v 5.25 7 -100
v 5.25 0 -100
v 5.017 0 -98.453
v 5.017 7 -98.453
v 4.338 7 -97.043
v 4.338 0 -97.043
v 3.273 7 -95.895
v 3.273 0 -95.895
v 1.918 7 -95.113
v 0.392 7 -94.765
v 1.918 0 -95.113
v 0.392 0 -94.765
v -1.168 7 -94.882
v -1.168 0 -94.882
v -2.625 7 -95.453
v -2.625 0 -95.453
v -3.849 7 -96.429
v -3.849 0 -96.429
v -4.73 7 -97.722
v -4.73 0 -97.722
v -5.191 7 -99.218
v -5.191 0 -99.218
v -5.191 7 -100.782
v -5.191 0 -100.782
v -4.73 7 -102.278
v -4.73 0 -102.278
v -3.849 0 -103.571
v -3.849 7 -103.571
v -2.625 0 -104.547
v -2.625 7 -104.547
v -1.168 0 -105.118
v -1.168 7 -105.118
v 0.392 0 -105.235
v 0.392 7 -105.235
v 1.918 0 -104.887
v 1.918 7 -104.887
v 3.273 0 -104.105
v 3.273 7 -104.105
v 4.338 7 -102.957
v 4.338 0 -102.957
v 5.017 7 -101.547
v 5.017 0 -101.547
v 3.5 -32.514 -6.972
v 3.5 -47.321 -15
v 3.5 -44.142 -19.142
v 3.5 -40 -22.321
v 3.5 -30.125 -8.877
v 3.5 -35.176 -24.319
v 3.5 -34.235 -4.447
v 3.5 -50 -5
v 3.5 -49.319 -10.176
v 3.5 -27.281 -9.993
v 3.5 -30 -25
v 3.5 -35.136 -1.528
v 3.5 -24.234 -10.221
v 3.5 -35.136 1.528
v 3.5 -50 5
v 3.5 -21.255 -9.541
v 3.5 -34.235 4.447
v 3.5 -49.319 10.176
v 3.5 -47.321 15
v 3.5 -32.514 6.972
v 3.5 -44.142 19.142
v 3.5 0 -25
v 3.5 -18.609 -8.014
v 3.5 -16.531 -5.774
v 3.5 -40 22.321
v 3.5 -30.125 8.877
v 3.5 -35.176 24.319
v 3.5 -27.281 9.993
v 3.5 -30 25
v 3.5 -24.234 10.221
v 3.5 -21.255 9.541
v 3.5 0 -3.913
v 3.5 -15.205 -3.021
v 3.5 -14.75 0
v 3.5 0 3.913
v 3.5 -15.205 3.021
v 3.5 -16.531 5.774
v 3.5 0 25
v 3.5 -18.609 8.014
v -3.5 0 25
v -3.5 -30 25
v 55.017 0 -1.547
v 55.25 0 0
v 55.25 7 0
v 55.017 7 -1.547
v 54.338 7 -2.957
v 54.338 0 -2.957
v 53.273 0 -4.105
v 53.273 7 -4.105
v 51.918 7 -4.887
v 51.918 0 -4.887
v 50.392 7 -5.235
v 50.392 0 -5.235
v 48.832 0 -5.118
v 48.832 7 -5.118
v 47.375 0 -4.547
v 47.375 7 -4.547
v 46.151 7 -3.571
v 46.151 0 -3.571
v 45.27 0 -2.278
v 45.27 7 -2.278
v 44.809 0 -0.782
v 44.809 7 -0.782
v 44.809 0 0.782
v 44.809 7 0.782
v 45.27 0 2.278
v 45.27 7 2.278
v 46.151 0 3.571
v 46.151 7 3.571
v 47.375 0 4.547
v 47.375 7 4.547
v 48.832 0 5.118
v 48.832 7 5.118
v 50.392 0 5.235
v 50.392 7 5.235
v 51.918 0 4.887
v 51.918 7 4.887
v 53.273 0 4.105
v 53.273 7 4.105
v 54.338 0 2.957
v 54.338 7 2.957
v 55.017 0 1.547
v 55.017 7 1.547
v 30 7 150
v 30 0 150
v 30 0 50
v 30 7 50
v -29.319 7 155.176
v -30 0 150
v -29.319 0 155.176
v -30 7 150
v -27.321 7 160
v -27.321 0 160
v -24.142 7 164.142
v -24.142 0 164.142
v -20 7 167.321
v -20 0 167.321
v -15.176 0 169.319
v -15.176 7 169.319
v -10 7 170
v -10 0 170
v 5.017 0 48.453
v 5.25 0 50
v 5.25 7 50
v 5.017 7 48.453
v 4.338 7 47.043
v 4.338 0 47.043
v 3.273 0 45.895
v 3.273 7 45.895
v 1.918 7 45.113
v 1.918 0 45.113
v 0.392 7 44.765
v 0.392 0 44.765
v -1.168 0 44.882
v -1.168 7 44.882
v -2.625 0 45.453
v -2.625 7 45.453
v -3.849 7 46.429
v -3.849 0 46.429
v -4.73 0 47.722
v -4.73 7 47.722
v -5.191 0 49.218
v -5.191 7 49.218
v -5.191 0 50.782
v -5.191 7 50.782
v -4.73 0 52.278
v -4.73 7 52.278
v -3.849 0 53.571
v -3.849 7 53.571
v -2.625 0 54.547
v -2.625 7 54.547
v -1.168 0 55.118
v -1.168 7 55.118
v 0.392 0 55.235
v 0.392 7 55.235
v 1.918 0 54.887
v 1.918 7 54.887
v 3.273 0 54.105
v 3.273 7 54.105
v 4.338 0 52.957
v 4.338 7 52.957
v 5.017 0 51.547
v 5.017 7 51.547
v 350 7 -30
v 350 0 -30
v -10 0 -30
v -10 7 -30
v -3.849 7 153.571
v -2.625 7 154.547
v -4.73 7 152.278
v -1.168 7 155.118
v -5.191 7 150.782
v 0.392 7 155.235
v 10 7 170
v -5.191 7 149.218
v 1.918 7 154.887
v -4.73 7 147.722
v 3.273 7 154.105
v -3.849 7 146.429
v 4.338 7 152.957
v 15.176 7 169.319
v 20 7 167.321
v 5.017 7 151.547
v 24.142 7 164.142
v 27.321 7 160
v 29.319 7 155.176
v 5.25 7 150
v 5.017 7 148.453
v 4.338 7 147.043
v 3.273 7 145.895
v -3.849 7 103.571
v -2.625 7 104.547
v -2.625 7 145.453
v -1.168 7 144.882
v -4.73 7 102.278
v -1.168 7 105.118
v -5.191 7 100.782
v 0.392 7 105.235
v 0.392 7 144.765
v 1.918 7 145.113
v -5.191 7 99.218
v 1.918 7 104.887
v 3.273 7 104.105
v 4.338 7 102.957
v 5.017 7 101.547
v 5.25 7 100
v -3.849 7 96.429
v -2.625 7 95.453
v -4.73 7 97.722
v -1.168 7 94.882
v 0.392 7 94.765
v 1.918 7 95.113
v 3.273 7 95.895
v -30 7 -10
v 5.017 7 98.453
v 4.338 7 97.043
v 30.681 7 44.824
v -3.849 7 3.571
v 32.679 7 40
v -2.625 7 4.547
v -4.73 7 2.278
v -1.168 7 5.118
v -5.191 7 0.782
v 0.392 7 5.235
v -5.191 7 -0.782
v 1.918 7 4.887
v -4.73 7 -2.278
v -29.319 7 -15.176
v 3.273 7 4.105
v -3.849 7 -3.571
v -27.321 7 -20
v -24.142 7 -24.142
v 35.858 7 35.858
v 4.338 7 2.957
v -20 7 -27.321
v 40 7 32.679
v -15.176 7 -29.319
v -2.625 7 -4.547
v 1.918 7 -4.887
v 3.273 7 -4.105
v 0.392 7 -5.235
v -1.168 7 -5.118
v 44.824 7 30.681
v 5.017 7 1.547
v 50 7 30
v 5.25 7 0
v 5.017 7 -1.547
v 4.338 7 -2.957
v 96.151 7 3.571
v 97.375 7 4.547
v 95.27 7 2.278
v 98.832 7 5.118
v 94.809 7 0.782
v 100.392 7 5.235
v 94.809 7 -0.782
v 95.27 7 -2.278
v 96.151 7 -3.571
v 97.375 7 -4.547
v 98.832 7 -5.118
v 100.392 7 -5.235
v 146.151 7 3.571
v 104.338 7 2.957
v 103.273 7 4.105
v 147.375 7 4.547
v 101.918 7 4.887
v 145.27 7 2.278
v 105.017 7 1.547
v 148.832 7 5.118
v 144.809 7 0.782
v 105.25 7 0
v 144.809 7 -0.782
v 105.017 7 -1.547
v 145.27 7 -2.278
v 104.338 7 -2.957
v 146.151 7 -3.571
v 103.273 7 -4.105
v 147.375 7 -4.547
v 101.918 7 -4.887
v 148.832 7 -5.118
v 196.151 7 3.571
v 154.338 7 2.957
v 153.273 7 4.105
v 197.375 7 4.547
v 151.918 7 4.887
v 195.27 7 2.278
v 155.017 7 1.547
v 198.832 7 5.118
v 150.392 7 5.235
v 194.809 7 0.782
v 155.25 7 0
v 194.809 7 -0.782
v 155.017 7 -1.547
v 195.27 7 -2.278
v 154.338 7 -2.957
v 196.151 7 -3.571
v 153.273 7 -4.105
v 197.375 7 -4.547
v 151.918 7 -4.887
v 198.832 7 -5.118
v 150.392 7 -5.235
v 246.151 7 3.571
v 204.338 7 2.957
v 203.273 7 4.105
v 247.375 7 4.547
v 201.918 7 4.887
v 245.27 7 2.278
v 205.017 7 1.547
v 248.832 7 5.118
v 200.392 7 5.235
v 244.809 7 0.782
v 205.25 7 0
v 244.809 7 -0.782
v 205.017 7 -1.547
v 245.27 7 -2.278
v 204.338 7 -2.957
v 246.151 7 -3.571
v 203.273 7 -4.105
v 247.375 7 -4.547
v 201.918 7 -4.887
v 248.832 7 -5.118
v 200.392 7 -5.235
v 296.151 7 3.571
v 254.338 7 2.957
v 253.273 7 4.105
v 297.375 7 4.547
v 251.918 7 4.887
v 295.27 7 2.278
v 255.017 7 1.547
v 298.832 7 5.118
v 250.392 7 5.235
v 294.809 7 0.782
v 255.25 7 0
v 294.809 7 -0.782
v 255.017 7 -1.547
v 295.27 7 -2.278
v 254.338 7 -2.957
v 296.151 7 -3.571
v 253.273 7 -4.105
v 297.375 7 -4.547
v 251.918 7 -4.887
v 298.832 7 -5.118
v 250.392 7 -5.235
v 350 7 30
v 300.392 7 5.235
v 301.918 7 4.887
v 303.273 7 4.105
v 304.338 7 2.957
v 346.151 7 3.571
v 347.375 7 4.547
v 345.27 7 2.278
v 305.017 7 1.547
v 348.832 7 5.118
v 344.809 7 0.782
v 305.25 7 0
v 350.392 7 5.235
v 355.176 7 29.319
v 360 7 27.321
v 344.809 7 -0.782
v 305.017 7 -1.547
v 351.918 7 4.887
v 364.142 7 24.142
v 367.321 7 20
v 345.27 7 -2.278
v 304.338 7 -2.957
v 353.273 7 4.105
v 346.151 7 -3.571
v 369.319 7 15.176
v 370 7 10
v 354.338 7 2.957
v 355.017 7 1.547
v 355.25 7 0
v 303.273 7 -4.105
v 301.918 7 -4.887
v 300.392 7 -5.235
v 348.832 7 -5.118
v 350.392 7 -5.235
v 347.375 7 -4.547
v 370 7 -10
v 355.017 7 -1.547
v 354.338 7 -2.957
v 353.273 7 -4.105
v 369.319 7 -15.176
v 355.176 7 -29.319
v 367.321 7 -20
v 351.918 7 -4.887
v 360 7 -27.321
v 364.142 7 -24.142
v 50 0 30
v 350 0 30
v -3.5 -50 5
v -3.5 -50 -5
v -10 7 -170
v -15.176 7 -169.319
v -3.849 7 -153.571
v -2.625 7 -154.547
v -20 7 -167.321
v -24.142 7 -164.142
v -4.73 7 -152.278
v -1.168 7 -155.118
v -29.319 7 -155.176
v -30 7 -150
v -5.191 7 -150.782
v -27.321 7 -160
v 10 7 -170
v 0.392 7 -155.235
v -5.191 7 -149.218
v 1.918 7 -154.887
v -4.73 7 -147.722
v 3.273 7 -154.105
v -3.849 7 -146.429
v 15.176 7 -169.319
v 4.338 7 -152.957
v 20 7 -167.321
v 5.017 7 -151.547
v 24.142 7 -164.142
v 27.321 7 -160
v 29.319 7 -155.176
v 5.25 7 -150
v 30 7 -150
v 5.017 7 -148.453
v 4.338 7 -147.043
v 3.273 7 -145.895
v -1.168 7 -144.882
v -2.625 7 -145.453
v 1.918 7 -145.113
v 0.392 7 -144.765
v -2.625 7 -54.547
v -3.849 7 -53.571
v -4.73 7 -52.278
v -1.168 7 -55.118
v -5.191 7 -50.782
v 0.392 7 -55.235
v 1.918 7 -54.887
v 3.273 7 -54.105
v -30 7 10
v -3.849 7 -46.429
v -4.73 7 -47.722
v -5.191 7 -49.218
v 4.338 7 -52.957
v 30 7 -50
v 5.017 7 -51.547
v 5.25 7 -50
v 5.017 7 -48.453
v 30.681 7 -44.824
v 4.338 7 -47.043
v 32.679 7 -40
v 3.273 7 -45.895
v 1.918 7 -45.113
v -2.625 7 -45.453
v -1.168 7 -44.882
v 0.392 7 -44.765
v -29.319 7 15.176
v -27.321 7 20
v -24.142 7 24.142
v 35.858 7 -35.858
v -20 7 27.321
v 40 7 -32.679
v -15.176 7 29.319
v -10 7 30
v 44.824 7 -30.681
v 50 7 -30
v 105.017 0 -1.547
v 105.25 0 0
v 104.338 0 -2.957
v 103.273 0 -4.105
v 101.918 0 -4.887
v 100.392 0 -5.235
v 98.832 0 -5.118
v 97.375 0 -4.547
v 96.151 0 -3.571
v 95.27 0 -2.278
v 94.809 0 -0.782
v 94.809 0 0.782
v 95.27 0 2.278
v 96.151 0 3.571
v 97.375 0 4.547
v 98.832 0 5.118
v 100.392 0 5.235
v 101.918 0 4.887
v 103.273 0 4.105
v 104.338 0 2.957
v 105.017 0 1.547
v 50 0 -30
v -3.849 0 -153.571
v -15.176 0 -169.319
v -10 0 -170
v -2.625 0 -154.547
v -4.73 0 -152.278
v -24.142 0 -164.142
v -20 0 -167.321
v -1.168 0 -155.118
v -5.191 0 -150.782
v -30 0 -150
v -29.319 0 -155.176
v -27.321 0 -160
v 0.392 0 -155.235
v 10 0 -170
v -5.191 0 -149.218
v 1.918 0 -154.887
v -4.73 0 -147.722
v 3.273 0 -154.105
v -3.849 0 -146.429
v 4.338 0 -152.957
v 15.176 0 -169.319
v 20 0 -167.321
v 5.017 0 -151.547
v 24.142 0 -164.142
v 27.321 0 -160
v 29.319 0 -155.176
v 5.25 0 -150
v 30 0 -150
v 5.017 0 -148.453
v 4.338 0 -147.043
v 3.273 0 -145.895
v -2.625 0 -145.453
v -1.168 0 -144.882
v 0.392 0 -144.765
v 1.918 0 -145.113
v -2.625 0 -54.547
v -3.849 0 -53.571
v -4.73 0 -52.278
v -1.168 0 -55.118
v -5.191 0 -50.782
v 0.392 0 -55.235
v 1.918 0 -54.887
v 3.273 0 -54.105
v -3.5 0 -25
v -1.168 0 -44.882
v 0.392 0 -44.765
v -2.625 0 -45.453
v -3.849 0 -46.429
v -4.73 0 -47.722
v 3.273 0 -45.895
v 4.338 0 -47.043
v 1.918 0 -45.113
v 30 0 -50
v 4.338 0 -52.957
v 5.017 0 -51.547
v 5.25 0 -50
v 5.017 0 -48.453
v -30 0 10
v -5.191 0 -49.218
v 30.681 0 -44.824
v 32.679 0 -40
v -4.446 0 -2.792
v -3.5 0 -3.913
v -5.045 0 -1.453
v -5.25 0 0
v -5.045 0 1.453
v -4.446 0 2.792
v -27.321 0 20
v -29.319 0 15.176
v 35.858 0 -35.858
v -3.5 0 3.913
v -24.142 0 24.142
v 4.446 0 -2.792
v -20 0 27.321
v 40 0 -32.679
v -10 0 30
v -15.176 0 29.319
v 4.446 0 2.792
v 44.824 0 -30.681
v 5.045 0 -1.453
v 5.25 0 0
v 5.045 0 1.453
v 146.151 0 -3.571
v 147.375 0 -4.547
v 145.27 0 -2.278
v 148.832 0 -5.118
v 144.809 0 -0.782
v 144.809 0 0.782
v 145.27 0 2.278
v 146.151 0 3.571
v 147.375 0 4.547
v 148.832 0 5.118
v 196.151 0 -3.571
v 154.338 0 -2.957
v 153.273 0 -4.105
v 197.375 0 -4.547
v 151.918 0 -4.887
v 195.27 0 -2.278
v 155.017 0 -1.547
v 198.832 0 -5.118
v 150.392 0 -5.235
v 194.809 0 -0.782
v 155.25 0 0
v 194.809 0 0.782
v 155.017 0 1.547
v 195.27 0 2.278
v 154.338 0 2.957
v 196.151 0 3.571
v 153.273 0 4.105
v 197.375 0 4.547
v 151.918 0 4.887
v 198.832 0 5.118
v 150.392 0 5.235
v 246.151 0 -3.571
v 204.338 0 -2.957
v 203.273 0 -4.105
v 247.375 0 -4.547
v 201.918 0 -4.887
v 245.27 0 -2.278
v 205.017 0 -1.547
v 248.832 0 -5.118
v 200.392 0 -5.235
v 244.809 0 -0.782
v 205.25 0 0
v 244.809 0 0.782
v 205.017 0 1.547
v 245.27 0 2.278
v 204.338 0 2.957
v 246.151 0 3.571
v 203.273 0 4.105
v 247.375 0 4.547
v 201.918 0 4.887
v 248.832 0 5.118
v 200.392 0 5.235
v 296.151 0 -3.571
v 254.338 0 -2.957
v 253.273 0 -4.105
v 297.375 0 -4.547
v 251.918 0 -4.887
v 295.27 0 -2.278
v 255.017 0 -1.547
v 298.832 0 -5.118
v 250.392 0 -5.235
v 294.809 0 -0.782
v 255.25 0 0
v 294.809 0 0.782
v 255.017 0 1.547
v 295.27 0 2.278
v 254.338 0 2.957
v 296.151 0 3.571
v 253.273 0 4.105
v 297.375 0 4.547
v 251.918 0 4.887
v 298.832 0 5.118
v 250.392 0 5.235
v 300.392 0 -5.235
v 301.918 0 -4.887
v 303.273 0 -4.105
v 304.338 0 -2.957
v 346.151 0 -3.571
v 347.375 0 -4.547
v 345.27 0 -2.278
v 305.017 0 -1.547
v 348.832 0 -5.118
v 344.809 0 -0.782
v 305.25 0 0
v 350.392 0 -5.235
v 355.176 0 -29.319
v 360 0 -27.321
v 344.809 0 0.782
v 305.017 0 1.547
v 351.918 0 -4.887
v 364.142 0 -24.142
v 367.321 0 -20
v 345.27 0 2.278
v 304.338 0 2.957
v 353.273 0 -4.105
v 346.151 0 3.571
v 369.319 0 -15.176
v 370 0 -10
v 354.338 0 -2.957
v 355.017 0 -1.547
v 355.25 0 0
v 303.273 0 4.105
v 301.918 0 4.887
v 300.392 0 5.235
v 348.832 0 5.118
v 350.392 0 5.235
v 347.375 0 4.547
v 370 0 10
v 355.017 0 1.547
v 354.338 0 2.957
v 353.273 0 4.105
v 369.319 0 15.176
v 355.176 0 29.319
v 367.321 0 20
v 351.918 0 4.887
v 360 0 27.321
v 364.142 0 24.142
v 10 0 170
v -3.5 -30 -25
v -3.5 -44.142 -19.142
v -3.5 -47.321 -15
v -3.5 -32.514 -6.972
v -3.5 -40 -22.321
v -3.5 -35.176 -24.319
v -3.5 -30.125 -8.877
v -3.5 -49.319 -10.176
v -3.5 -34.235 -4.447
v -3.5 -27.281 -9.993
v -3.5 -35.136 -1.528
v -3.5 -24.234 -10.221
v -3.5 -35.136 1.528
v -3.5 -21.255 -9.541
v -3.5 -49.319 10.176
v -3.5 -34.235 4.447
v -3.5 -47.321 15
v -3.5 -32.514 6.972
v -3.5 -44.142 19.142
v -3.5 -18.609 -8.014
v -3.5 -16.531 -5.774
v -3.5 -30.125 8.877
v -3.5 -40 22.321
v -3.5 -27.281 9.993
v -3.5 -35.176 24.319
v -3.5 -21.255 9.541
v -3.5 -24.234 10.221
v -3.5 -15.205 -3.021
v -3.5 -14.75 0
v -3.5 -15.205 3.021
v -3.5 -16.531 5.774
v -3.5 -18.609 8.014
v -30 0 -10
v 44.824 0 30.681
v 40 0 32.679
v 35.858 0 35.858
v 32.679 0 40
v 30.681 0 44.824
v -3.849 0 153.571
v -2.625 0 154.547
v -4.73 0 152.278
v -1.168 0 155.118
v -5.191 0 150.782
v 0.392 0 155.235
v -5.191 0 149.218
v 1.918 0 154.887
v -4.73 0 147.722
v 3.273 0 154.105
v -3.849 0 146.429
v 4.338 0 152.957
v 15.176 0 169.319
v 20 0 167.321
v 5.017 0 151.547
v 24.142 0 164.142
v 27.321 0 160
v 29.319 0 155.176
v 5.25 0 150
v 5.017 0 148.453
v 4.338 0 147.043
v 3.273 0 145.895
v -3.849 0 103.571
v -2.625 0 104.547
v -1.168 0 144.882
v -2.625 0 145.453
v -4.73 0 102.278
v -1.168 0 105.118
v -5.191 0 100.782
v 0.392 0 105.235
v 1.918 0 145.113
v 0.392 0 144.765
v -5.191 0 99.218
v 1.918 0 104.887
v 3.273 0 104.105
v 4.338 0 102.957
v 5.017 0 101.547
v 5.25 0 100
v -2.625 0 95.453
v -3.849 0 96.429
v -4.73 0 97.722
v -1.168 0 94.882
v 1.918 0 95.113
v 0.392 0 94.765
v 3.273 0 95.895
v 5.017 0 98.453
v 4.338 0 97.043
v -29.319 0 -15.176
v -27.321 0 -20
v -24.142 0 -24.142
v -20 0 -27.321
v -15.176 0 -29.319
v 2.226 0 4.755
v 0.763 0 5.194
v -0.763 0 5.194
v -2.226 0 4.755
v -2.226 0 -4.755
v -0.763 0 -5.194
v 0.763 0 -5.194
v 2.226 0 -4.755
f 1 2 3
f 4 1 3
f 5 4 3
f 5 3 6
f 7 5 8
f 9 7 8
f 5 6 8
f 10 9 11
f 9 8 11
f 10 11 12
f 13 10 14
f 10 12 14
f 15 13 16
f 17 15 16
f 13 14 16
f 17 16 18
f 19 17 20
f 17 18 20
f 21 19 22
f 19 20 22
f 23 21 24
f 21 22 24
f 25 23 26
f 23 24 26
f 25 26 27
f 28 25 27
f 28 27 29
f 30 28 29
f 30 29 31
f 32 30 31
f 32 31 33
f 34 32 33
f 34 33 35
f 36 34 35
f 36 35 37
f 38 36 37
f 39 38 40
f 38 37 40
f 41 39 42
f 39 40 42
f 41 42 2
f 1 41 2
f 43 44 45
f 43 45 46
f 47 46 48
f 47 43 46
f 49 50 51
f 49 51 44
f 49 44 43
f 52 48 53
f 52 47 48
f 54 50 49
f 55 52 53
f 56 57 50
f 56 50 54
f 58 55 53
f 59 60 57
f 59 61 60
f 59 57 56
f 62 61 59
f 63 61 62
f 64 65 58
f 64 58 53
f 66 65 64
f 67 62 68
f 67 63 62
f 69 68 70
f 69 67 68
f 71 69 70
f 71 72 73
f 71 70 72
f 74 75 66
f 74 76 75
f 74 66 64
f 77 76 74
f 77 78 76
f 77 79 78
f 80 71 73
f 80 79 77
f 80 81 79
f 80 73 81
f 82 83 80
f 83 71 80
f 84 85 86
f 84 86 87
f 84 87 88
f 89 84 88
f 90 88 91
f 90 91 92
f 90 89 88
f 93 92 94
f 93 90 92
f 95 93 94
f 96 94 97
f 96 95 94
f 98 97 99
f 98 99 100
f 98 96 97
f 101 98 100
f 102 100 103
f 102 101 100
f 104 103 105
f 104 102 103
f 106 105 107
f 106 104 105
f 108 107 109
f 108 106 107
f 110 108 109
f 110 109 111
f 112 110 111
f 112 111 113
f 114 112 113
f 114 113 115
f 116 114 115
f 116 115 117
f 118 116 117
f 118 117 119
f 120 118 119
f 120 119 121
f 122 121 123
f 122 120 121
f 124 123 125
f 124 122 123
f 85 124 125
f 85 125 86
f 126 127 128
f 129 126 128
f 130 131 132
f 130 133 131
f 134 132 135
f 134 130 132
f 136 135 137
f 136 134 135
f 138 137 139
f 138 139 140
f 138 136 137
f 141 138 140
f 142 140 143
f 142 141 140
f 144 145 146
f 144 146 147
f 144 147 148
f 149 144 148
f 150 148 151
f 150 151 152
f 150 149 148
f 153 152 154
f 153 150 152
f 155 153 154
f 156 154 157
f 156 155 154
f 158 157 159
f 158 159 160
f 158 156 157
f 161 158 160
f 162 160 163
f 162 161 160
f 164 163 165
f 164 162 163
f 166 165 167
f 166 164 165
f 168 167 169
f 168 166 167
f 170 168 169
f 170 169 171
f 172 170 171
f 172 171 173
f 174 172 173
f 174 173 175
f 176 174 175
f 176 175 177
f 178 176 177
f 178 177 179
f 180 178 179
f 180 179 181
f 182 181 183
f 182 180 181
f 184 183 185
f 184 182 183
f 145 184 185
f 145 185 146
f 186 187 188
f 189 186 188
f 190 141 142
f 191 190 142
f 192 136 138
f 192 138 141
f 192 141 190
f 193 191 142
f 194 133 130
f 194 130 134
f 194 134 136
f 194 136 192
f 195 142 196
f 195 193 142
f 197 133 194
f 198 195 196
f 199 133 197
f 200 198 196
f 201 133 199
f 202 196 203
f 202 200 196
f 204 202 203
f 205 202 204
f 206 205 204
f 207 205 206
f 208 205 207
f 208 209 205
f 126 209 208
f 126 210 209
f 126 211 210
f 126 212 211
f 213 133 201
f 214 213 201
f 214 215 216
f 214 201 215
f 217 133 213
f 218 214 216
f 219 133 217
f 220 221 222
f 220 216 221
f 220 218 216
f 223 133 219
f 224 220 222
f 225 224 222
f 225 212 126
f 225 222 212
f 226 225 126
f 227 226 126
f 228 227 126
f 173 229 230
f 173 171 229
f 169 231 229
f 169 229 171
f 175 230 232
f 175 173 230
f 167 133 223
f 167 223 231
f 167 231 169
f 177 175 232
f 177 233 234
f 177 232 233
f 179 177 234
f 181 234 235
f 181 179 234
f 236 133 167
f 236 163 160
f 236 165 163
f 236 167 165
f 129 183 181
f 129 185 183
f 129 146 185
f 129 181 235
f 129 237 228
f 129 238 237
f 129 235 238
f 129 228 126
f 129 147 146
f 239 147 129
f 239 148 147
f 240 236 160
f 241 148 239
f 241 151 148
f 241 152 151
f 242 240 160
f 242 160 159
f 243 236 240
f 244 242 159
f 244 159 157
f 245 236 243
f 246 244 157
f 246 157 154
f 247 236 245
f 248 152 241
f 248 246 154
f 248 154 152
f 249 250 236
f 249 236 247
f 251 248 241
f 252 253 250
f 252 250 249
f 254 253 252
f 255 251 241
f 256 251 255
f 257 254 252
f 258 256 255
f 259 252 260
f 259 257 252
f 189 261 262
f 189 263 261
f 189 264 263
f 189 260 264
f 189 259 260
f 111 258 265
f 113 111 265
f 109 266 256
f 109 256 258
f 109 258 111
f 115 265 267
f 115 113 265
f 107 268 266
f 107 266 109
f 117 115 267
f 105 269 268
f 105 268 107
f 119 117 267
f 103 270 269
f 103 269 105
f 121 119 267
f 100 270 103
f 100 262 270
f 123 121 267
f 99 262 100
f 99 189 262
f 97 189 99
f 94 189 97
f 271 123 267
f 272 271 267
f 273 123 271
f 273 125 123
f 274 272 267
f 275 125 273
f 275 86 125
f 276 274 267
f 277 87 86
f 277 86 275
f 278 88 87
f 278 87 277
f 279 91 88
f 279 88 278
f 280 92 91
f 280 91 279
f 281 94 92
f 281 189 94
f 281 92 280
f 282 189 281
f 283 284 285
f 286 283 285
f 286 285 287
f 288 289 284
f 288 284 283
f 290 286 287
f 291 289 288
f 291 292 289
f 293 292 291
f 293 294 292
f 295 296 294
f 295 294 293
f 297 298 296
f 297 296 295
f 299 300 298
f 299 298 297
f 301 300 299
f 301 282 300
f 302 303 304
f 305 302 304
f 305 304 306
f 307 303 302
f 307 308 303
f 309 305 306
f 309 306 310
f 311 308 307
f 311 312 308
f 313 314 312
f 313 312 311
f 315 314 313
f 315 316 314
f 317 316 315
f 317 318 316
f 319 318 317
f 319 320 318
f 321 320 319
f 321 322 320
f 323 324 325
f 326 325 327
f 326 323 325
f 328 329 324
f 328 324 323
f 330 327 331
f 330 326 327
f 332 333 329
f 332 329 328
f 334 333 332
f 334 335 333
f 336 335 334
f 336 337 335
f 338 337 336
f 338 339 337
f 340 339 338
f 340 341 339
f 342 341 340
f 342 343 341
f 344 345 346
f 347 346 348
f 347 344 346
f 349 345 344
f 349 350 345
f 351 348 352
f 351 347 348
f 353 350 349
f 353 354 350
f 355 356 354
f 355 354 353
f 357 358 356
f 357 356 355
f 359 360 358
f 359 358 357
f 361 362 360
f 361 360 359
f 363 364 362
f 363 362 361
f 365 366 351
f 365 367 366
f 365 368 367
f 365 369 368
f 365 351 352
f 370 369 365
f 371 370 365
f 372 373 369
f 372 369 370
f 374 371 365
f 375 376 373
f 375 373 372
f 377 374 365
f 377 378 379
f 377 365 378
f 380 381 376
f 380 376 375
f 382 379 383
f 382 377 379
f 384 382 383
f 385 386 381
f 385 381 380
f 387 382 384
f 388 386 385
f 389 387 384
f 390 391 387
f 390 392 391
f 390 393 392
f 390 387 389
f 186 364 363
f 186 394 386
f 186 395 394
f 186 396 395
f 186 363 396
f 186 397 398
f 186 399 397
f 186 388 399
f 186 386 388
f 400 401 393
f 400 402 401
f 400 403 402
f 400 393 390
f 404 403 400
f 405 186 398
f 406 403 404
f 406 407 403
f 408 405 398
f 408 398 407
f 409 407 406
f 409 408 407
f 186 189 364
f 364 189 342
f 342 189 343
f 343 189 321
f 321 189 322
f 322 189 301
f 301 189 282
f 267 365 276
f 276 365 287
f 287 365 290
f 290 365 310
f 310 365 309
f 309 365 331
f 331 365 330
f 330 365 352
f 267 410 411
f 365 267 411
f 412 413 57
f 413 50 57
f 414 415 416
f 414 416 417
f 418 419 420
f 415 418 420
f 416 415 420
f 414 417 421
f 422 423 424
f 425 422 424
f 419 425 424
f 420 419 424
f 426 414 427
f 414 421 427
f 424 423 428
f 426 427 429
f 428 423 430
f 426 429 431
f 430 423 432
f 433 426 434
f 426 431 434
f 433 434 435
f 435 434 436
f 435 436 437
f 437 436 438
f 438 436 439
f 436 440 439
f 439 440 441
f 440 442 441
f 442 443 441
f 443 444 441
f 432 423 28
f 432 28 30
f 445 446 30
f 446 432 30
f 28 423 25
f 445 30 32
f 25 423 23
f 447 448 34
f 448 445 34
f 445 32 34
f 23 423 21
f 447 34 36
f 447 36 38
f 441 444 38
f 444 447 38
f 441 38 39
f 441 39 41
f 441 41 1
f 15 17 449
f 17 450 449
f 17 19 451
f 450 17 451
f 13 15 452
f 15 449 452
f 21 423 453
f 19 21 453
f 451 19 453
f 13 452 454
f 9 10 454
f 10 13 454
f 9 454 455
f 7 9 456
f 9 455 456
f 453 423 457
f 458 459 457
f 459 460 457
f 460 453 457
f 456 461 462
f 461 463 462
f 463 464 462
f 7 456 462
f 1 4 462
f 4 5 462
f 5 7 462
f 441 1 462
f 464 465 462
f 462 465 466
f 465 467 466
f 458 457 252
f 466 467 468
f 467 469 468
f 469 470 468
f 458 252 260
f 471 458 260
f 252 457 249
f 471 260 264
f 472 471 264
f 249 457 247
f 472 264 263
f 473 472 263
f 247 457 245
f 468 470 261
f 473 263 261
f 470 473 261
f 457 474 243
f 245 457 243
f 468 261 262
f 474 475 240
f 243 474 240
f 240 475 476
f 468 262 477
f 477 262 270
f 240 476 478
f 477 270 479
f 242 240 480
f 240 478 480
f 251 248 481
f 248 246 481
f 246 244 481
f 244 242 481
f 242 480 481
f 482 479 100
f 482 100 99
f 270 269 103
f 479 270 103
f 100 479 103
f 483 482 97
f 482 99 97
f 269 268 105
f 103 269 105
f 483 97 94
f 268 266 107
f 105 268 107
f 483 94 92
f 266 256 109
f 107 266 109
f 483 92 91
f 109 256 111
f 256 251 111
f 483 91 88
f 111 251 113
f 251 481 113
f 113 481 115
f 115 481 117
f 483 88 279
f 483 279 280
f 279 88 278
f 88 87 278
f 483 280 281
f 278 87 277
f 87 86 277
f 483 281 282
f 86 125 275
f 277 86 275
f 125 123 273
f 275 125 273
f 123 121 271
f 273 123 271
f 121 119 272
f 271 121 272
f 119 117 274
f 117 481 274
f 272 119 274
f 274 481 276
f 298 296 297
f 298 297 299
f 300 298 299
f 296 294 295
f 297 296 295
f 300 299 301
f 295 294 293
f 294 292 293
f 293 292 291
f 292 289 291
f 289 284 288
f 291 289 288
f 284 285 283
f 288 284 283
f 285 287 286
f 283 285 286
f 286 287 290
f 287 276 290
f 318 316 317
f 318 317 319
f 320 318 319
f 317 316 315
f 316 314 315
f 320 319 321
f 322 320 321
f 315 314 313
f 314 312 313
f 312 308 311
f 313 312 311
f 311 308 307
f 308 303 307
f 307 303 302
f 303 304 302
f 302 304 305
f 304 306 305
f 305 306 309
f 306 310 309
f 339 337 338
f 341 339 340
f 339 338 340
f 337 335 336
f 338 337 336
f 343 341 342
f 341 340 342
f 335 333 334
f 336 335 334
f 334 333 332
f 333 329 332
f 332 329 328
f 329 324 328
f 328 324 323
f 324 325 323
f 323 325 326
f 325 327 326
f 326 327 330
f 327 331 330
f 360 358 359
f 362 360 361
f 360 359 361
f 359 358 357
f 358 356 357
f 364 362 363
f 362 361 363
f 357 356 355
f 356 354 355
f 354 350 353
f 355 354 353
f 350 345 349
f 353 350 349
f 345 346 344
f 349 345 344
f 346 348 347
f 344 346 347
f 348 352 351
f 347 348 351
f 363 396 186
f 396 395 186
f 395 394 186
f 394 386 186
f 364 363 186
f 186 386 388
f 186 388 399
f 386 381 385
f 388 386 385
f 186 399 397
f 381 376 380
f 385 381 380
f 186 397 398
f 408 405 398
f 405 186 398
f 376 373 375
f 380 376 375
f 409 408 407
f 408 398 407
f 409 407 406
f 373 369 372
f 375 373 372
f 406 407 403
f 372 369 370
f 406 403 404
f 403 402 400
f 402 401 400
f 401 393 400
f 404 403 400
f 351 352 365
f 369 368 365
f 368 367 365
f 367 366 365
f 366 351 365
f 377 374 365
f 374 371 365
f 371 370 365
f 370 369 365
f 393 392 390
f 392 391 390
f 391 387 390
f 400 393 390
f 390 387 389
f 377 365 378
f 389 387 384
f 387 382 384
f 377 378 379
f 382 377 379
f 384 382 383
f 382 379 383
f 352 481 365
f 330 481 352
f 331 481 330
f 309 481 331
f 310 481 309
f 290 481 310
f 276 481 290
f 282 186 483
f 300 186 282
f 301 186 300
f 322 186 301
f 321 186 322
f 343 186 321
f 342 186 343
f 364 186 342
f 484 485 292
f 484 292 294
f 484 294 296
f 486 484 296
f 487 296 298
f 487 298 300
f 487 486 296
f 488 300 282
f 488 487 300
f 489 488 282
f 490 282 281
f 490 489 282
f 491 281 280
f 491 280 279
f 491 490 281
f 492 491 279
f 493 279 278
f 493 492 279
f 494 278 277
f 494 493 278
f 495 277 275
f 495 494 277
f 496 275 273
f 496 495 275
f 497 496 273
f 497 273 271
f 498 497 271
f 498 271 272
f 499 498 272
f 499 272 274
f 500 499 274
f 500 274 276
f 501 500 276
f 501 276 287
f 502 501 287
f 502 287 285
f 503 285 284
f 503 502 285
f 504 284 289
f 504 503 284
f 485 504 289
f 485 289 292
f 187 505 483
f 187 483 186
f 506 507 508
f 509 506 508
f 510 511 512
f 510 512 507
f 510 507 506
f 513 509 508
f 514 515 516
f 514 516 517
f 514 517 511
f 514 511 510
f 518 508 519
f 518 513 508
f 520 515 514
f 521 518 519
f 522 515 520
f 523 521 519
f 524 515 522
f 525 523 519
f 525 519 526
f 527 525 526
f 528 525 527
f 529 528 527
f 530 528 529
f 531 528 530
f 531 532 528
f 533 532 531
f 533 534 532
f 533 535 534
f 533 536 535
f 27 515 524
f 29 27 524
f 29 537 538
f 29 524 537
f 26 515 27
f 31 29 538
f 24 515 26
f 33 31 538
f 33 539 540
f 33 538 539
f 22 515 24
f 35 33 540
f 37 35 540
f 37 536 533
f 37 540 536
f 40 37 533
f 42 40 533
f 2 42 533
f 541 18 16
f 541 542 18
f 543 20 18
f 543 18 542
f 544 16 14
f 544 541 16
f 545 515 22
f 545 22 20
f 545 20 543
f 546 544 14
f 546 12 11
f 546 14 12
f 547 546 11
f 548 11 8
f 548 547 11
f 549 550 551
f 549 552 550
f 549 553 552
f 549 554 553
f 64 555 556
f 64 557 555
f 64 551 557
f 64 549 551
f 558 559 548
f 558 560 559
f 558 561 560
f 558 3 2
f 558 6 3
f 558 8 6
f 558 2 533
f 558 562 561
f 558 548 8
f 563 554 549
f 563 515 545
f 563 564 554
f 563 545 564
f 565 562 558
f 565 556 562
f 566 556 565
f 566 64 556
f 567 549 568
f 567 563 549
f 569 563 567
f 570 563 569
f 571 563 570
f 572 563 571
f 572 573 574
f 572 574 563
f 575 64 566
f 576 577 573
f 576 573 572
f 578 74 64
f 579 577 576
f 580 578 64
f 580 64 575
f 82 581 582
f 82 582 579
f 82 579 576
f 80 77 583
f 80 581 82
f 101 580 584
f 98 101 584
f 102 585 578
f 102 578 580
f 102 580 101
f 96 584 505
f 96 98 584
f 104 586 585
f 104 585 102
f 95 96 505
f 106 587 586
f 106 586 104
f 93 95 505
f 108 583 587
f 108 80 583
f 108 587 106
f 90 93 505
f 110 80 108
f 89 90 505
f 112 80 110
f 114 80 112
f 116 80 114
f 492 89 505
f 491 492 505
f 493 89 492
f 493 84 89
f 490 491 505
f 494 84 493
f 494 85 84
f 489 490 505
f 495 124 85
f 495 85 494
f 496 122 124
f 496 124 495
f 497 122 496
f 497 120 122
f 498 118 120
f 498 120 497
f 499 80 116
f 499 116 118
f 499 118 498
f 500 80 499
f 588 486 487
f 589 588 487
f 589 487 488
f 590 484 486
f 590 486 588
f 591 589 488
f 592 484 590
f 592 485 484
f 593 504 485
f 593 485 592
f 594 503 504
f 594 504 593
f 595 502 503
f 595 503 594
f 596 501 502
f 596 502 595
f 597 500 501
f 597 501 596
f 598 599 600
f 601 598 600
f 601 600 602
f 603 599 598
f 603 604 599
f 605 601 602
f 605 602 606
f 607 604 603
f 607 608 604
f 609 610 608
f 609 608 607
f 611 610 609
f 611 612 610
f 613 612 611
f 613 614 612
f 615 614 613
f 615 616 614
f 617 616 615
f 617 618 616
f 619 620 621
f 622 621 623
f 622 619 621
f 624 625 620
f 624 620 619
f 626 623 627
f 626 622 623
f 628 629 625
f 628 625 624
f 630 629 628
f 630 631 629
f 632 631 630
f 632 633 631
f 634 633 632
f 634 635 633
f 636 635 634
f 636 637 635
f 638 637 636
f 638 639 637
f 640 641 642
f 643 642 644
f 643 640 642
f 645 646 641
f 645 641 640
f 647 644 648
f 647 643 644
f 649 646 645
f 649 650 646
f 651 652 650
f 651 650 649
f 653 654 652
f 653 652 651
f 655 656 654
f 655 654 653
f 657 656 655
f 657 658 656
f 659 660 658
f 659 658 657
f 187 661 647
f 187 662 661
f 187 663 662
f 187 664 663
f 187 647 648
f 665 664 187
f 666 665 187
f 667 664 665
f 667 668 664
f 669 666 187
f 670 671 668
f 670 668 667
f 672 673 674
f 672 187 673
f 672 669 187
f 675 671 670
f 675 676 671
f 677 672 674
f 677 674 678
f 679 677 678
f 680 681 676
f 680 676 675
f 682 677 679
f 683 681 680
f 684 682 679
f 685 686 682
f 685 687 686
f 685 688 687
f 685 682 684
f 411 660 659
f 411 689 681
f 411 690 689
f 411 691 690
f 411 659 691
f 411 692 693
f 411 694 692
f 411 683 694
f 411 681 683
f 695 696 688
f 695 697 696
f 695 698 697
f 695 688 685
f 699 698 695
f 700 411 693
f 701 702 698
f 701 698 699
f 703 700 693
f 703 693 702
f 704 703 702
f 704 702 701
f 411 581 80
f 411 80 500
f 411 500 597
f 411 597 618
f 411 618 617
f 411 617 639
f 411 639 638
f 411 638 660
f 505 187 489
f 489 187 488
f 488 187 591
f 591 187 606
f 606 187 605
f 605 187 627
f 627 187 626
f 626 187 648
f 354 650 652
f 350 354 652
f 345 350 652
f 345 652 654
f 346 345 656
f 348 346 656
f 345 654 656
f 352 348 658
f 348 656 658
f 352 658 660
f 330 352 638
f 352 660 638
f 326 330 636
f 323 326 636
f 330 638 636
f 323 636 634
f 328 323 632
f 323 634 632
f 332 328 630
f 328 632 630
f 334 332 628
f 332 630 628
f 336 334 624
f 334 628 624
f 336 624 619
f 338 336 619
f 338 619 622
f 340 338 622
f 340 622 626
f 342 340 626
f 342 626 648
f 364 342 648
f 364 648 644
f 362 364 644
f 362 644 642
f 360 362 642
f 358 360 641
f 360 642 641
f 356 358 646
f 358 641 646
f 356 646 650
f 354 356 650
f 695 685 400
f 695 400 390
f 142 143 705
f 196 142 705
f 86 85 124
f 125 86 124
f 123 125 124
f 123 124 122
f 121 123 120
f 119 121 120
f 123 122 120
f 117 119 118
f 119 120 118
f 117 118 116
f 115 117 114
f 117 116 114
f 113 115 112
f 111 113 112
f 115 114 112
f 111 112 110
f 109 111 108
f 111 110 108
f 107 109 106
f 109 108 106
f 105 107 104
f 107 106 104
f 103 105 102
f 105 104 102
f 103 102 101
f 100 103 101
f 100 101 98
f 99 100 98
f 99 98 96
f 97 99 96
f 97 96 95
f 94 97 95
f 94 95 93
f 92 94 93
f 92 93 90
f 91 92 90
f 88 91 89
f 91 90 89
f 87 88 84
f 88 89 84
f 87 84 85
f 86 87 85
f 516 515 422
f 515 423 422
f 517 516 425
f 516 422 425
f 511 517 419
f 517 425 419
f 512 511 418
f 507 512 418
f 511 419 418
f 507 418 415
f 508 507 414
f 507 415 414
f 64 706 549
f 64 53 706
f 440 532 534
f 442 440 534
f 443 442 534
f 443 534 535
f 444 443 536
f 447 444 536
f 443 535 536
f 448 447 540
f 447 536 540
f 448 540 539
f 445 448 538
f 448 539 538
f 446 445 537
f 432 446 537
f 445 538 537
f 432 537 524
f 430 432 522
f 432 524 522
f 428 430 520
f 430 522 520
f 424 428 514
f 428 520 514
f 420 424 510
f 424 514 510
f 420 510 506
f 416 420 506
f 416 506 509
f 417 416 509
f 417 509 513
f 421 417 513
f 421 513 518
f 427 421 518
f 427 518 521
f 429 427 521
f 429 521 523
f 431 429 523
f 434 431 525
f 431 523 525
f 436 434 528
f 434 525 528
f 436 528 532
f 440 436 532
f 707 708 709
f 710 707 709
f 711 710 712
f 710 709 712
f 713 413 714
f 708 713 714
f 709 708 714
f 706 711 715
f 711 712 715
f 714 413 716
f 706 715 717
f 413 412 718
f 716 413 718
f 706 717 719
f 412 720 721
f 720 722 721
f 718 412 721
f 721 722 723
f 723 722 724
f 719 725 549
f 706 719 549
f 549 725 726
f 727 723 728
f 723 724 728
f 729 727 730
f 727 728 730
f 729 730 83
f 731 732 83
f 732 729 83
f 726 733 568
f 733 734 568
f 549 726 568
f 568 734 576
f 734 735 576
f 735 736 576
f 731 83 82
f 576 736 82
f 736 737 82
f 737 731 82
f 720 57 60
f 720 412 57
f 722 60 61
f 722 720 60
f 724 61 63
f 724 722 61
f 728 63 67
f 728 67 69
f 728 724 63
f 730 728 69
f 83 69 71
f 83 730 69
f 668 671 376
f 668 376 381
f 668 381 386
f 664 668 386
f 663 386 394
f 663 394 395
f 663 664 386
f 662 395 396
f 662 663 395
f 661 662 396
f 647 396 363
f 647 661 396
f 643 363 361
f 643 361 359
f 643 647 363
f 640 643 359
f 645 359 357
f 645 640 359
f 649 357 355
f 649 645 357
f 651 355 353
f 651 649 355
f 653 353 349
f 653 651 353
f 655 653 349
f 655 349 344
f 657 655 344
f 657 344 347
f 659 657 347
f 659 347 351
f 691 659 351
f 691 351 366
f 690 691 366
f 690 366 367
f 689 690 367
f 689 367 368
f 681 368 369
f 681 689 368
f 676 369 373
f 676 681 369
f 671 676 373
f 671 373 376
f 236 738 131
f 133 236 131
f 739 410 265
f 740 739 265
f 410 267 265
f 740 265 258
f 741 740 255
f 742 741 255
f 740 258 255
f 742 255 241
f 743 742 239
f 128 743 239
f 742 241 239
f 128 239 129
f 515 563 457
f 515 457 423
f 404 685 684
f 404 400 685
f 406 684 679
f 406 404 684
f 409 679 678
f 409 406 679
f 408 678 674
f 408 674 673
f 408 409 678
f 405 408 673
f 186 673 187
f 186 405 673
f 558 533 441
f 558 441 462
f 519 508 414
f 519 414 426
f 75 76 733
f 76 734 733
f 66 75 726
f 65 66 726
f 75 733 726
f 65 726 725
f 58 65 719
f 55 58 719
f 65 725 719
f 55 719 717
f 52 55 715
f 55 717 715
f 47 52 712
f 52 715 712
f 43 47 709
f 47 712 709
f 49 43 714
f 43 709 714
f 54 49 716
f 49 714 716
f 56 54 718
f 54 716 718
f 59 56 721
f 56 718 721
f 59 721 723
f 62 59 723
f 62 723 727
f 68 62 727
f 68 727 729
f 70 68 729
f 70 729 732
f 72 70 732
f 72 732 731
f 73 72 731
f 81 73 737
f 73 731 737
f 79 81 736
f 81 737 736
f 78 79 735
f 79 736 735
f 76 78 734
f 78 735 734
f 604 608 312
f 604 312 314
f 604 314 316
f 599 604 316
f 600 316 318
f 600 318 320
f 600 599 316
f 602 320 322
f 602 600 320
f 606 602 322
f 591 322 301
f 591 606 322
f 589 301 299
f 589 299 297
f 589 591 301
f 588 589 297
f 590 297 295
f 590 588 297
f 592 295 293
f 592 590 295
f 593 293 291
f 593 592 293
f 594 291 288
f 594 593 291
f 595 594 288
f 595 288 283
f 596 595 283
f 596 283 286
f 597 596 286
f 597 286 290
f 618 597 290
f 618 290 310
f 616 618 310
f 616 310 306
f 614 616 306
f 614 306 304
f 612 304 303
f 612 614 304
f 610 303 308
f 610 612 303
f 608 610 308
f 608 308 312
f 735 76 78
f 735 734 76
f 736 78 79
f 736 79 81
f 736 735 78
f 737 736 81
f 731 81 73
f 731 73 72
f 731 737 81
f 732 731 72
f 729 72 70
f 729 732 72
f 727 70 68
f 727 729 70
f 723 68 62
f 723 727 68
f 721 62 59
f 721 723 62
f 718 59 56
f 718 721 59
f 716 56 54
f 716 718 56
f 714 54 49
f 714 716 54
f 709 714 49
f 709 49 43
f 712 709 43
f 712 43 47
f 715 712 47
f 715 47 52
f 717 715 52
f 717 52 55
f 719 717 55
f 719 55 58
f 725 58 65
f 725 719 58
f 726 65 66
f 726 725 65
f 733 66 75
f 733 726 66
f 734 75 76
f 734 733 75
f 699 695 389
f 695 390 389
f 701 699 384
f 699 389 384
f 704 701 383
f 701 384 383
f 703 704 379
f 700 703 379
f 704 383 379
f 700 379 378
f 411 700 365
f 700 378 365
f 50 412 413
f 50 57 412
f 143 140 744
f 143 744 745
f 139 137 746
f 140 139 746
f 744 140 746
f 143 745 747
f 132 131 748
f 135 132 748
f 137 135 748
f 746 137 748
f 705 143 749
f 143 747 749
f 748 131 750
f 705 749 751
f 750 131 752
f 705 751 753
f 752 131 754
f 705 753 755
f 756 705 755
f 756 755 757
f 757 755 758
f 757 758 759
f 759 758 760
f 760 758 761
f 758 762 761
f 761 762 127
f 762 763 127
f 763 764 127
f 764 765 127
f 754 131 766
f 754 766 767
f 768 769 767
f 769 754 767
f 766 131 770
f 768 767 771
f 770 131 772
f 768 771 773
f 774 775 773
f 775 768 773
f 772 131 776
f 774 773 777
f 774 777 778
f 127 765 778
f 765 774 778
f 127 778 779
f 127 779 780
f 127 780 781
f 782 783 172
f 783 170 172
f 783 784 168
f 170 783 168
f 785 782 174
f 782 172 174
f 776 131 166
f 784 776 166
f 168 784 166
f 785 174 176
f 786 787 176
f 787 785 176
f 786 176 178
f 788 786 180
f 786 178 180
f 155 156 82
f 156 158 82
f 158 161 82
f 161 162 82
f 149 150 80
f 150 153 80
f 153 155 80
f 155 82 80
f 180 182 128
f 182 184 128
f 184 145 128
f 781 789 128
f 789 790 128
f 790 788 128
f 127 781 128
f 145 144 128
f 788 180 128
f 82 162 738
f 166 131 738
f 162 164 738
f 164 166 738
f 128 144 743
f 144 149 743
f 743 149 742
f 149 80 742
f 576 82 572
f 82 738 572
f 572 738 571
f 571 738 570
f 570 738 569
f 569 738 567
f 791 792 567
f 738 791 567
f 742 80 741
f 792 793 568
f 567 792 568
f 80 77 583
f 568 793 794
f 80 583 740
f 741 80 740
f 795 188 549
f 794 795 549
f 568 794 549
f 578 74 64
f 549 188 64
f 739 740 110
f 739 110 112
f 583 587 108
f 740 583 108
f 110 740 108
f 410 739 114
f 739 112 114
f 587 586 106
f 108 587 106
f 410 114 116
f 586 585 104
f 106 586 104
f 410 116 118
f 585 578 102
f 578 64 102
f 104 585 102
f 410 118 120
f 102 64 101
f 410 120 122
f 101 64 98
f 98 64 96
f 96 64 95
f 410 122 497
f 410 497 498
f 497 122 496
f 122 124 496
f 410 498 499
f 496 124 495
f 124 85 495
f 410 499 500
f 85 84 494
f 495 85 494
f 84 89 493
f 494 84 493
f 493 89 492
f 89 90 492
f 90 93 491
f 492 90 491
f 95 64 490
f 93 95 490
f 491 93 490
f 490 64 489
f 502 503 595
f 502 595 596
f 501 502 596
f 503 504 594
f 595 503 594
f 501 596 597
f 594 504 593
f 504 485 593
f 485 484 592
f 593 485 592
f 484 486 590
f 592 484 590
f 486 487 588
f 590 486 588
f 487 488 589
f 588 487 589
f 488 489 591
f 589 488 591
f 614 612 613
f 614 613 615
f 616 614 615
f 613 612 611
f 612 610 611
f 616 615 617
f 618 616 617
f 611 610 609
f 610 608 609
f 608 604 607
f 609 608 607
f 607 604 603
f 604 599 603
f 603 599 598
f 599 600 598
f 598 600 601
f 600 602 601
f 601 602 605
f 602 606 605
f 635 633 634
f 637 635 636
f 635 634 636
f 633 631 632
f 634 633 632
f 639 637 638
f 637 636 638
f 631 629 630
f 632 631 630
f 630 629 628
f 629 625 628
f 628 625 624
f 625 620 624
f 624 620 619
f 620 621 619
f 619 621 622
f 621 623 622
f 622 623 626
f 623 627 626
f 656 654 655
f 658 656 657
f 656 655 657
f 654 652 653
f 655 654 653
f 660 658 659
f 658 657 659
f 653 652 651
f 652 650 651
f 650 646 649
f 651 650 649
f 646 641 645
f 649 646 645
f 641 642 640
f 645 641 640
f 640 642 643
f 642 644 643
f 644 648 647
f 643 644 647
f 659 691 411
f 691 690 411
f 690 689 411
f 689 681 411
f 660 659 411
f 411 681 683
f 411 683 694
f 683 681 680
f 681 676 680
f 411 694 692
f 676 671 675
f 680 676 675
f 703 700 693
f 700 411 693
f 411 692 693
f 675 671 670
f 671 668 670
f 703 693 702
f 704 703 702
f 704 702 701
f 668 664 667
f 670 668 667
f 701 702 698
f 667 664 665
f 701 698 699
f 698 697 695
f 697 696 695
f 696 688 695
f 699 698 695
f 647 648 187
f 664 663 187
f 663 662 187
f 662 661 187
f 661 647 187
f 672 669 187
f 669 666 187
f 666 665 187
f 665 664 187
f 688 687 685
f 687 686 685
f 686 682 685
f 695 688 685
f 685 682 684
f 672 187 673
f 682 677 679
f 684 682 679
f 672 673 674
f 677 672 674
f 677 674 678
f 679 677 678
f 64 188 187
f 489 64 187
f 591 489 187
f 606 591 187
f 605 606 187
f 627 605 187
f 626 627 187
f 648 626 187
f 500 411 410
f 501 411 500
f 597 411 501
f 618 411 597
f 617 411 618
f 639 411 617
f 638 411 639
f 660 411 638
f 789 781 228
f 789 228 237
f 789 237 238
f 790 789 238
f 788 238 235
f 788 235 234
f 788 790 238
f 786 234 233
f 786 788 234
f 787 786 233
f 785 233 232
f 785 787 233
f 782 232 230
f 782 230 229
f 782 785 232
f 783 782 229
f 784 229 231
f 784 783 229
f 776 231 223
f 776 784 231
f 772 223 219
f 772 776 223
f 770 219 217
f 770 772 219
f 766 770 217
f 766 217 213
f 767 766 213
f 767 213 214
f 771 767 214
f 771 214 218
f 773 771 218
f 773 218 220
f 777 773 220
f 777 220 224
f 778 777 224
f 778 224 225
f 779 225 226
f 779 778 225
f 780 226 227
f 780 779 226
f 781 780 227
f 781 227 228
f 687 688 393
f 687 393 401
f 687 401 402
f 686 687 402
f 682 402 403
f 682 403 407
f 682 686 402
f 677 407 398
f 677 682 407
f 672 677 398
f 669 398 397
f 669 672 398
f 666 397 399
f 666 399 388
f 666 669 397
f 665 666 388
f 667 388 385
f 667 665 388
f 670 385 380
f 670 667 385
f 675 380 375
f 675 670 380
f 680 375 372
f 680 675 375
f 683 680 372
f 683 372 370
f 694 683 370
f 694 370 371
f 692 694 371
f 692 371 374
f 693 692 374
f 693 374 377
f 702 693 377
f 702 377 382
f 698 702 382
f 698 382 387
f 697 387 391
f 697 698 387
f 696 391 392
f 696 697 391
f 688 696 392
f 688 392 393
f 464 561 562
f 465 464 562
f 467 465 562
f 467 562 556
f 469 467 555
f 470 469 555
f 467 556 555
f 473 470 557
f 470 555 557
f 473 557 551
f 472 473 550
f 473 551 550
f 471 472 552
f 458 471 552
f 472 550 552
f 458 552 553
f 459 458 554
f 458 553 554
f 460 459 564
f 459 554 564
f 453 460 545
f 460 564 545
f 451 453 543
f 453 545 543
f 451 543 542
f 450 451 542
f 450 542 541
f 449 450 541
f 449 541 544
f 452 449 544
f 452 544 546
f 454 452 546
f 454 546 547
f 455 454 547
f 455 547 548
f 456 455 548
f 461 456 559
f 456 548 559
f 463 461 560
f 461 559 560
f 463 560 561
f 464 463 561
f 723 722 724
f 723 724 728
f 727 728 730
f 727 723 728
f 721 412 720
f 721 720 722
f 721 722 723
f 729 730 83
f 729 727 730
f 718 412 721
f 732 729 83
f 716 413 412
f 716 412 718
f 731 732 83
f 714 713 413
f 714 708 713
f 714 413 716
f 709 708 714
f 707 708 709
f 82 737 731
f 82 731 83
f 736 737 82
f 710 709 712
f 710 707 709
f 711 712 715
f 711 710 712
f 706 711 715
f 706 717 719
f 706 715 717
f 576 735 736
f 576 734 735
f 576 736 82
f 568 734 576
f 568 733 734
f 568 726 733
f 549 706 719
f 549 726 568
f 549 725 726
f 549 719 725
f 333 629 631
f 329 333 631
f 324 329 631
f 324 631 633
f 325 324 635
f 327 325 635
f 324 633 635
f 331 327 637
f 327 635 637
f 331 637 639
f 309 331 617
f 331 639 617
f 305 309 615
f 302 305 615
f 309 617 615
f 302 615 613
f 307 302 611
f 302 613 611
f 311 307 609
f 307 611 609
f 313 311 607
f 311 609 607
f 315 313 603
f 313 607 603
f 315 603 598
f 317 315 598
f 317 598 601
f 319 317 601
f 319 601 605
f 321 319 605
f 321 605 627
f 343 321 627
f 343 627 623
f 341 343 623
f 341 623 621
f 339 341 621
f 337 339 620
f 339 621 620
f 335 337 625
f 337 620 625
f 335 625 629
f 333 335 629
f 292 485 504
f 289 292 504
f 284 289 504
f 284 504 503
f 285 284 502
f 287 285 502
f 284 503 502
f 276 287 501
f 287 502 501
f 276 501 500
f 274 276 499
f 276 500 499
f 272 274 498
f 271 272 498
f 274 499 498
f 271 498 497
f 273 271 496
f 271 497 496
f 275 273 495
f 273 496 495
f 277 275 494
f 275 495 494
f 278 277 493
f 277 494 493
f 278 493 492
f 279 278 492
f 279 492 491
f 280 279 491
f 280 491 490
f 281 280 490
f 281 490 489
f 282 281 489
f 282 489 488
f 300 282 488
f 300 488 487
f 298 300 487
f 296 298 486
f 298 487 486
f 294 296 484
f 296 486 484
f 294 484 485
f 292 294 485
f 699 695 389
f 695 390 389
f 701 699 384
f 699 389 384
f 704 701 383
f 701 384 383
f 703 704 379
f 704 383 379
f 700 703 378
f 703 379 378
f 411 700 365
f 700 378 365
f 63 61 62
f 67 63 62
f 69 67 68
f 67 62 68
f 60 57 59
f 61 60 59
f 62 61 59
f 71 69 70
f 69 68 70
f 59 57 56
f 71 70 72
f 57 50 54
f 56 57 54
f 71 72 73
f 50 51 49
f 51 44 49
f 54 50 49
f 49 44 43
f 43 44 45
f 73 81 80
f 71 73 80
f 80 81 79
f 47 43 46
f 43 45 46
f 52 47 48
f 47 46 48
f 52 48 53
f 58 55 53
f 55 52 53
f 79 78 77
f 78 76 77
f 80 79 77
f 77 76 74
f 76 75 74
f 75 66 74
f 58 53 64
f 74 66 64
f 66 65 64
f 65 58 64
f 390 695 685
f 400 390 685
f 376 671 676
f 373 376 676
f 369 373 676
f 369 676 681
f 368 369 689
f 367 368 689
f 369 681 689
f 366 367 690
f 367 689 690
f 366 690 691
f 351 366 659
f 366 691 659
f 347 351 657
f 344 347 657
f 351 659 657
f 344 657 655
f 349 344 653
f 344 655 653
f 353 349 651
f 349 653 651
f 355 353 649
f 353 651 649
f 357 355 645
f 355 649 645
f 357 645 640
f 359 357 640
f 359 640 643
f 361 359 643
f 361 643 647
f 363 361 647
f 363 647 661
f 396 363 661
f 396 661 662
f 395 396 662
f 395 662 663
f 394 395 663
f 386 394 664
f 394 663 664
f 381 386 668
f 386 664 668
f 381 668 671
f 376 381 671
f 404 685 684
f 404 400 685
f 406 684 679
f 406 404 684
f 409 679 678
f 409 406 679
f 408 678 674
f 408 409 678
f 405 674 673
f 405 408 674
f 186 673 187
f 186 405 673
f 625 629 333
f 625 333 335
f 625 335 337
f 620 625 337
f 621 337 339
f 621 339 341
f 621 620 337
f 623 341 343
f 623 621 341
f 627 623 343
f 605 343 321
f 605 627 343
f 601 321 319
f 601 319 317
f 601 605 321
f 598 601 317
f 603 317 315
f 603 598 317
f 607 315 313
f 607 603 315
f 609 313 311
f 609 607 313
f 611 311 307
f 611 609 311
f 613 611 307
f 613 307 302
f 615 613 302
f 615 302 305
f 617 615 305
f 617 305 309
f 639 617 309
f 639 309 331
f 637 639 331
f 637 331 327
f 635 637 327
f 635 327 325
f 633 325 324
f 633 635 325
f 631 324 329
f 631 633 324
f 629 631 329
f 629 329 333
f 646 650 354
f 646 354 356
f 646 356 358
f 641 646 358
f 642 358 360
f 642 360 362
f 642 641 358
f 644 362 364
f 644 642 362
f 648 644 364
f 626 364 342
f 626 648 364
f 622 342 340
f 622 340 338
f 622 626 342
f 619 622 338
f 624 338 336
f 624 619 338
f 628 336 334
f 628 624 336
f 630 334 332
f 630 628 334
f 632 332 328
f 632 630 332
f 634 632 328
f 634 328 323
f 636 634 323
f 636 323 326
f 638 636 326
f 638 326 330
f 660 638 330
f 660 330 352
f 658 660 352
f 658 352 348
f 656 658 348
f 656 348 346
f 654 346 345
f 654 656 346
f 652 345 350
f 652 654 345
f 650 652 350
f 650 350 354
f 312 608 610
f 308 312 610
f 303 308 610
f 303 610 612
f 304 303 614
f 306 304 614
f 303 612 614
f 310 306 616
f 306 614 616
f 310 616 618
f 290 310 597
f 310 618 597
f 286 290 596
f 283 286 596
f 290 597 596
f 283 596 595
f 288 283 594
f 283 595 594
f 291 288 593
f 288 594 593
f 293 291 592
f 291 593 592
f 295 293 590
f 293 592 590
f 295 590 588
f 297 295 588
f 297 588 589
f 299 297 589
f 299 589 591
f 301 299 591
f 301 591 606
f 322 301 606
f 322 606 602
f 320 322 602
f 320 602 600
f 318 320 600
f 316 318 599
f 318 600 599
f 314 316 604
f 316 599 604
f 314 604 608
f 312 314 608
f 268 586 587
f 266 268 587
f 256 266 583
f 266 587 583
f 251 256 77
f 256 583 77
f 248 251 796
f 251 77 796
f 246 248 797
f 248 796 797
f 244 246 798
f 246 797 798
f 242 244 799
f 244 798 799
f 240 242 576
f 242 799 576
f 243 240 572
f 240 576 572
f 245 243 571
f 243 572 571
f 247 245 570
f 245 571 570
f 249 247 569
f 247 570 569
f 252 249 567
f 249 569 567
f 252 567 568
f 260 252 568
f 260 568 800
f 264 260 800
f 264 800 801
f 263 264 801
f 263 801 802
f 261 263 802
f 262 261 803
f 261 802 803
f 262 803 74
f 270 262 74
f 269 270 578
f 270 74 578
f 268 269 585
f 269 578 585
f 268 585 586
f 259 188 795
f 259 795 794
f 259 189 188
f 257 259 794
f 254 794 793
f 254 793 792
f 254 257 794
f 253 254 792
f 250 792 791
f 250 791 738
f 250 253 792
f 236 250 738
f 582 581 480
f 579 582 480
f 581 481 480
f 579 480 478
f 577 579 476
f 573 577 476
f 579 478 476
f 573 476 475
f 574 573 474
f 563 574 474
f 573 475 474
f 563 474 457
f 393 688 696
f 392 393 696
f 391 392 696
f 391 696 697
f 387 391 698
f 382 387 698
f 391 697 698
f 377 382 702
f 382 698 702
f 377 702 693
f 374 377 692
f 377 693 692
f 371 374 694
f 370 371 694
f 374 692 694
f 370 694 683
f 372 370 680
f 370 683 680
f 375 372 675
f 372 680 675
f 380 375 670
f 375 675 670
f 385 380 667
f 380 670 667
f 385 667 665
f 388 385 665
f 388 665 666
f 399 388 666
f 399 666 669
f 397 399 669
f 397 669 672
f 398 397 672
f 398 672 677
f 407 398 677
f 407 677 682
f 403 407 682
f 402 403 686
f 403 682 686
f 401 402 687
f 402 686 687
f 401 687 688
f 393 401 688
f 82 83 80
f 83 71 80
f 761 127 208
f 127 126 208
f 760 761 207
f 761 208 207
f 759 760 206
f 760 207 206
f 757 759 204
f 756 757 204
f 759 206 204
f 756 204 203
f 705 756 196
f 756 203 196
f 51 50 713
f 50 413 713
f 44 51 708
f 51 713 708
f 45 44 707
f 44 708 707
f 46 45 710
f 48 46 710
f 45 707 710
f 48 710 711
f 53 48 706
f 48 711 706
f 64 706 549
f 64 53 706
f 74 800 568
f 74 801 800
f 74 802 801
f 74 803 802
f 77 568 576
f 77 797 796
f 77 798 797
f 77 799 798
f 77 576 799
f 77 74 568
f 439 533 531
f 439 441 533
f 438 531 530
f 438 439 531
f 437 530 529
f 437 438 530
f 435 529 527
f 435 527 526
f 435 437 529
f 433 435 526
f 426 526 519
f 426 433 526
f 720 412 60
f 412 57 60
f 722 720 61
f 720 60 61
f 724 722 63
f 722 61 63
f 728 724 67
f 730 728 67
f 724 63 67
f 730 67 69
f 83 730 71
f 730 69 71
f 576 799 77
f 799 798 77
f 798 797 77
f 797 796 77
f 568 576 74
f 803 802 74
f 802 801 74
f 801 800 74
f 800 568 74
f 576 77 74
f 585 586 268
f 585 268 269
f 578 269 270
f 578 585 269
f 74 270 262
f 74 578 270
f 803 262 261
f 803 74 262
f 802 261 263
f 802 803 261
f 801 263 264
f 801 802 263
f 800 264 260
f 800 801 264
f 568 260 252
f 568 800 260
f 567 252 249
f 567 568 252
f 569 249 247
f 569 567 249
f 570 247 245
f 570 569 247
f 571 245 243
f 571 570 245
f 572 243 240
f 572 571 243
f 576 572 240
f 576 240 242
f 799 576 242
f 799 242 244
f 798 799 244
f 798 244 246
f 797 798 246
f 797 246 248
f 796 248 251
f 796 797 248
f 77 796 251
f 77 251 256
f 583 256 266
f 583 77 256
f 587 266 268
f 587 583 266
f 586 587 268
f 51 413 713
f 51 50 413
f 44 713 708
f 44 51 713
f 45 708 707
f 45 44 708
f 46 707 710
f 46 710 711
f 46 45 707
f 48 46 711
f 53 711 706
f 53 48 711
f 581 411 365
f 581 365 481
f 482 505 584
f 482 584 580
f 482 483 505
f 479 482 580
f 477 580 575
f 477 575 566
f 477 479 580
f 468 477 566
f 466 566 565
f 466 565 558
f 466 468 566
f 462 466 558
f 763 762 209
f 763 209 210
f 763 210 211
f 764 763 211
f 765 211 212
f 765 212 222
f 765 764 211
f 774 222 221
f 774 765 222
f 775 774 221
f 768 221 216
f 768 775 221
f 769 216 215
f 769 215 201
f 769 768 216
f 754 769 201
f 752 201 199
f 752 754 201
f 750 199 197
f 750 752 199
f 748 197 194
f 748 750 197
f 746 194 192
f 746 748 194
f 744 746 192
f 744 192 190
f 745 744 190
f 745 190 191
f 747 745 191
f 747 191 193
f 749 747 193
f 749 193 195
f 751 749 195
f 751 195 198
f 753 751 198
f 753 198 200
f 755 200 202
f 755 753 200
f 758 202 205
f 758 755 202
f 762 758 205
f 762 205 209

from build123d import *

# Parameters (mm, degrees)
F0_R     = 5.25
F1_DEPTH = 7
F2_W     = 50
F2_H     = 50
F2_R     = 10.25
F3_DEPTH = 3.5
F4_R     = 20


with BuildPart() as f1:
    # F0 (on Front) → F1 (new body)
    with BuildSketch(Plane.XZ):
        Polygon((370, -30), (370, 30), (-30, 30), (-30, -170), (30, -170), (30, -30), align=None)
        with Locations((0, -150)):
            Circle(F0_R, mode=Mode.SUBTRACT)
        with Locations((0, -100)):
            Circle(F0_R, mode=Mode.SUBTRACT)
        with Locations((0, -50)):
            Circle(F0_R, mode=Mode.SUBTRACT)
        Circle(F0_R, mode=Mode.SUBTRACT)
        with Locations((50, 0)):
            Circle(F0_R, mode=Mode.SUBTRACT)
        with Locations((100, 0)):
            Circle(F0_R, mode=Mode.SUBTRACT)
        with Locations((150, 0)):
            Circle(F0_R, mode=Mode.SUBTRACT)
        with Locations((200, 0)):
            Circle(F0_R, mode=Mode.SUBTRACT)
        with Locations((250, 0)):
            Circle(F0_R, mode=Mode.SUBTRACT)
        with Locations((300, 0)):
            Circle(F0_R, mode=Mode.SUBTRACT)
        with Locations((350, 0)):
            Circle(F0_R, mode=Mode.SUBTRACT)
    extrude(amount=-F1_DEPTH)

    # F2 (on Right) → F3 (join, symmetric)
    with BuildSketch(Plane.YZ):
        with Locations((-25, 0)):
            Rectangle(F2_W, F2_H)
        with Locations((-25, 0)):
            Circle(F2_R, mode=Mode.SUBTRACT)
    extrude(amount=F3_DEPTH, both=True)

    # F4
    f4_edges = [f1.edges().sort_by_distance(p)[0] for p in [
        (0, -50, 25),
        (0, -50, -25),
        (370, 3.5, 30),
        (370, 3.5, -30),
        (30, 3.5, -170),
        (-30, 3.5, -170),
        (-30, 3.5, 30),
        (30, 3.5, -30),
    ]]
    fillet(f4_edges, radius=F4_R)


with BuildPart() as f5_1:
    # F5: instance of F1
    add(f1.part.mirror(Plane.XY))


solid = Compound([f1.part, f5_1.part])
